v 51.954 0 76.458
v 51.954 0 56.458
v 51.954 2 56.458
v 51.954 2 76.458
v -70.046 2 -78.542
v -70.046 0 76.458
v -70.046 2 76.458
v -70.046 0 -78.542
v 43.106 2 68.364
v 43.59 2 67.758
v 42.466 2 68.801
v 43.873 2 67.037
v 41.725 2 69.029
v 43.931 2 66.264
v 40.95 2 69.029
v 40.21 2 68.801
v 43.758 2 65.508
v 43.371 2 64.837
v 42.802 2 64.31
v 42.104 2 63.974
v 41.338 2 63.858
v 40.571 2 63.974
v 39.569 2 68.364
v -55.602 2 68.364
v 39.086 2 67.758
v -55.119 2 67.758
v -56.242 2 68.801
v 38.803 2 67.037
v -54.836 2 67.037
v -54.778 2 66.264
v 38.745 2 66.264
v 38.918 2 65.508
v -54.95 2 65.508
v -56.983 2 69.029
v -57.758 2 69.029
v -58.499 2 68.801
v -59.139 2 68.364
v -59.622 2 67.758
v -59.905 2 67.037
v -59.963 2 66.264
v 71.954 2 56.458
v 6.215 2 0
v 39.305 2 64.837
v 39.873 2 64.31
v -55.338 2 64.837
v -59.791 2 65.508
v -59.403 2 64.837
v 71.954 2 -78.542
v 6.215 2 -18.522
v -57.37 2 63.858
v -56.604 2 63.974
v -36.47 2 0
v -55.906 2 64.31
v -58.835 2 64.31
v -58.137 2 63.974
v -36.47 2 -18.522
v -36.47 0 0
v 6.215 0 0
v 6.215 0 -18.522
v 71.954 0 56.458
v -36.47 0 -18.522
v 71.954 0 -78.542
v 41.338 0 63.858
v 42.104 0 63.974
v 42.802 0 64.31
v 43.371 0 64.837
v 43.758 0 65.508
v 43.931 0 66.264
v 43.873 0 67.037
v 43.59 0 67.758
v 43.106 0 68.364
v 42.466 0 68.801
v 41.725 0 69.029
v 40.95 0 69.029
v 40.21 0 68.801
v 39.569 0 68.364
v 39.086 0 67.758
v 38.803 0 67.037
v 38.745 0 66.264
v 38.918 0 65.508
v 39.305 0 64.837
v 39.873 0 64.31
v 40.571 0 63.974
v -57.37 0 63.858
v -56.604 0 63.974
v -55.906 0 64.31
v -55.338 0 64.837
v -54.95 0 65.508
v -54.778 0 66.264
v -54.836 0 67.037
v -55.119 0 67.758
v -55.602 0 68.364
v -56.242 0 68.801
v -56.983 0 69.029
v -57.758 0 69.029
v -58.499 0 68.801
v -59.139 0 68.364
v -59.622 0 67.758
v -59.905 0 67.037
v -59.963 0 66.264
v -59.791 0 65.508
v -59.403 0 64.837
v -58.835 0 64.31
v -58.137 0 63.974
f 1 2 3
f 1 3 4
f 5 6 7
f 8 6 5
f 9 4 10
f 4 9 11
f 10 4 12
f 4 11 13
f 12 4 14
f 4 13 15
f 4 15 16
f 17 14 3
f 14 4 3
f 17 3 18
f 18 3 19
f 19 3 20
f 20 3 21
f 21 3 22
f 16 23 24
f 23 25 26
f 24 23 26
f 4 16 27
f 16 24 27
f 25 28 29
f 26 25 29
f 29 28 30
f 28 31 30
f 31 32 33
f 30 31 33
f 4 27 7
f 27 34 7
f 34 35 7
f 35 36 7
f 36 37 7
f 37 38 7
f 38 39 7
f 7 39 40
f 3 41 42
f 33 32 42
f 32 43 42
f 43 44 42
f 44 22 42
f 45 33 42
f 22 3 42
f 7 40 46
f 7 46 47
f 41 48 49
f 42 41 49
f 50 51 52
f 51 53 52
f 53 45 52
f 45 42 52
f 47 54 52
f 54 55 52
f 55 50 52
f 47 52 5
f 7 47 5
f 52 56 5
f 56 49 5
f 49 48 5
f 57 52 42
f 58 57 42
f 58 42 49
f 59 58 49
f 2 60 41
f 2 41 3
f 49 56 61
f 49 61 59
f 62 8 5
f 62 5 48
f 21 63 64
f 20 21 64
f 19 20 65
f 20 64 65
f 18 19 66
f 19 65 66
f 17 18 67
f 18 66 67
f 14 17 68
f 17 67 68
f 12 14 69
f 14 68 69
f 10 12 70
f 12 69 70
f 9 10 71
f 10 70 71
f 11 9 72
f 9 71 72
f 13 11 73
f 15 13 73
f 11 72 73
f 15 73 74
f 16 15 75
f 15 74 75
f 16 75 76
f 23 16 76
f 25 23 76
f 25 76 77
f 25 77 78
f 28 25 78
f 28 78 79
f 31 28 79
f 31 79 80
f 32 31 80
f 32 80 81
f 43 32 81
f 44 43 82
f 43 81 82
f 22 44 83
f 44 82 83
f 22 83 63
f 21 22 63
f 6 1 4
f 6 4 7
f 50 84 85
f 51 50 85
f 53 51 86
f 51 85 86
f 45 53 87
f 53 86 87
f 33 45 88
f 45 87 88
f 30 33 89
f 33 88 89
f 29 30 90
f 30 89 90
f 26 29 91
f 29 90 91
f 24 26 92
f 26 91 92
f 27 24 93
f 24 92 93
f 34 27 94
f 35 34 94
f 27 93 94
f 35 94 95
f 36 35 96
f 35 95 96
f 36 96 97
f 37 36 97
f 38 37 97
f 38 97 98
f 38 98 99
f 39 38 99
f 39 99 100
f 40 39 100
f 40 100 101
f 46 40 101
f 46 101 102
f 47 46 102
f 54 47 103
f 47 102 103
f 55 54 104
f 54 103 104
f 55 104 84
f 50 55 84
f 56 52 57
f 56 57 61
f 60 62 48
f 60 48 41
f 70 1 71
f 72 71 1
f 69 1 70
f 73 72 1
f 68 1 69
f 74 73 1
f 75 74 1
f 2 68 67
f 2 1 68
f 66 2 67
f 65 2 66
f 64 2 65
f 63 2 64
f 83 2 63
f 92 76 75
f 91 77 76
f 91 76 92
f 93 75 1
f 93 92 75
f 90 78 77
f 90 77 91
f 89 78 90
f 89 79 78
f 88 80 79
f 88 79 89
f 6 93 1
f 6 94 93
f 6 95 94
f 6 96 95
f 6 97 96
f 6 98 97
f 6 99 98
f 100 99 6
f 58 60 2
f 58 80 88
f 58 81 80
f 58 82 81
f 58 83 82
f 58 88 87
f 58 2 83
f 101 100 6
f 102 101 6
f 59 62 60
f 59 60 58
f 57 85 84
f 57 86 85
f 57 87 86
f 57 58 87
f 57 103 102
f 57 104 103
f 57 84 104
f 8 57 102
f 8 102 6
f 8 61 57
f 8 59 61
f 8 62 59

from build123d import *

# Parameters (mm, degrees)
P_IDAT_VYSUNUT_M1_DEPTH  = 2
SKICA2_W                 = 42.685297449
SKICA2_H                 = 18.521827687
ODEBRAT_VYSUNUT_M1_DEPTH = 2
SKICA3_R                 = 2.6
ODEBRAT_VYSUNUT_M2_DEPTH = 2


with BuildPart() as part:
    # Skica1 → Přidat vysunutím1 (new body)
    with BuildSketch(Plane(origin=(0, 0, 0), x_dir=(1, 0, 0), z_dir=(0, 1, 0))):
        Polygon((51.954387959, -76.458238495), (-70.045612041, -76.458238495), (-70.045612041, 78.541761505), (71.954387959, 78.541761505), (71.954387959, -56.458238495), (51.954387959, -56.458238495), align=None)
    extrude(amount=P_IDAT_VYSUNUT_M1_DEPTH)

    # Skica2 → Odebrat vysunutím1 (cut)
    with BuildSketch(Plane(origin=(0, 2, 0), x_dir=(1, 0, 0), z_dir=(0, 1, 0))):
        with Locations((-15.127554213, 9.260913844)):
            Rectangle(SKICA2_W, SKICA2_H)
    extrude(amount=-ODEBRAT_VYSUNUT_M1_DEPTH, mode=Mode.SUBTRACT)

    # Skica3 → Odebrat vysunutím2 (cut)
    with BuildSketch(Plane.XZ):
        with Locations(Location((41.337845964, 66.458238495, 0), (0, 0, 270))):
            Circle(SKICA3_R)
        with Locations(Location((-57.3704334, 66.458238495, 0), (0, 0, 270))):
            Circle(SKICA3_R)
    extrude(amount=-ODEBRAT_VYSUNUT_M2_DEPTH, mode=Mode.SUBTRACT)


solid = part.part
